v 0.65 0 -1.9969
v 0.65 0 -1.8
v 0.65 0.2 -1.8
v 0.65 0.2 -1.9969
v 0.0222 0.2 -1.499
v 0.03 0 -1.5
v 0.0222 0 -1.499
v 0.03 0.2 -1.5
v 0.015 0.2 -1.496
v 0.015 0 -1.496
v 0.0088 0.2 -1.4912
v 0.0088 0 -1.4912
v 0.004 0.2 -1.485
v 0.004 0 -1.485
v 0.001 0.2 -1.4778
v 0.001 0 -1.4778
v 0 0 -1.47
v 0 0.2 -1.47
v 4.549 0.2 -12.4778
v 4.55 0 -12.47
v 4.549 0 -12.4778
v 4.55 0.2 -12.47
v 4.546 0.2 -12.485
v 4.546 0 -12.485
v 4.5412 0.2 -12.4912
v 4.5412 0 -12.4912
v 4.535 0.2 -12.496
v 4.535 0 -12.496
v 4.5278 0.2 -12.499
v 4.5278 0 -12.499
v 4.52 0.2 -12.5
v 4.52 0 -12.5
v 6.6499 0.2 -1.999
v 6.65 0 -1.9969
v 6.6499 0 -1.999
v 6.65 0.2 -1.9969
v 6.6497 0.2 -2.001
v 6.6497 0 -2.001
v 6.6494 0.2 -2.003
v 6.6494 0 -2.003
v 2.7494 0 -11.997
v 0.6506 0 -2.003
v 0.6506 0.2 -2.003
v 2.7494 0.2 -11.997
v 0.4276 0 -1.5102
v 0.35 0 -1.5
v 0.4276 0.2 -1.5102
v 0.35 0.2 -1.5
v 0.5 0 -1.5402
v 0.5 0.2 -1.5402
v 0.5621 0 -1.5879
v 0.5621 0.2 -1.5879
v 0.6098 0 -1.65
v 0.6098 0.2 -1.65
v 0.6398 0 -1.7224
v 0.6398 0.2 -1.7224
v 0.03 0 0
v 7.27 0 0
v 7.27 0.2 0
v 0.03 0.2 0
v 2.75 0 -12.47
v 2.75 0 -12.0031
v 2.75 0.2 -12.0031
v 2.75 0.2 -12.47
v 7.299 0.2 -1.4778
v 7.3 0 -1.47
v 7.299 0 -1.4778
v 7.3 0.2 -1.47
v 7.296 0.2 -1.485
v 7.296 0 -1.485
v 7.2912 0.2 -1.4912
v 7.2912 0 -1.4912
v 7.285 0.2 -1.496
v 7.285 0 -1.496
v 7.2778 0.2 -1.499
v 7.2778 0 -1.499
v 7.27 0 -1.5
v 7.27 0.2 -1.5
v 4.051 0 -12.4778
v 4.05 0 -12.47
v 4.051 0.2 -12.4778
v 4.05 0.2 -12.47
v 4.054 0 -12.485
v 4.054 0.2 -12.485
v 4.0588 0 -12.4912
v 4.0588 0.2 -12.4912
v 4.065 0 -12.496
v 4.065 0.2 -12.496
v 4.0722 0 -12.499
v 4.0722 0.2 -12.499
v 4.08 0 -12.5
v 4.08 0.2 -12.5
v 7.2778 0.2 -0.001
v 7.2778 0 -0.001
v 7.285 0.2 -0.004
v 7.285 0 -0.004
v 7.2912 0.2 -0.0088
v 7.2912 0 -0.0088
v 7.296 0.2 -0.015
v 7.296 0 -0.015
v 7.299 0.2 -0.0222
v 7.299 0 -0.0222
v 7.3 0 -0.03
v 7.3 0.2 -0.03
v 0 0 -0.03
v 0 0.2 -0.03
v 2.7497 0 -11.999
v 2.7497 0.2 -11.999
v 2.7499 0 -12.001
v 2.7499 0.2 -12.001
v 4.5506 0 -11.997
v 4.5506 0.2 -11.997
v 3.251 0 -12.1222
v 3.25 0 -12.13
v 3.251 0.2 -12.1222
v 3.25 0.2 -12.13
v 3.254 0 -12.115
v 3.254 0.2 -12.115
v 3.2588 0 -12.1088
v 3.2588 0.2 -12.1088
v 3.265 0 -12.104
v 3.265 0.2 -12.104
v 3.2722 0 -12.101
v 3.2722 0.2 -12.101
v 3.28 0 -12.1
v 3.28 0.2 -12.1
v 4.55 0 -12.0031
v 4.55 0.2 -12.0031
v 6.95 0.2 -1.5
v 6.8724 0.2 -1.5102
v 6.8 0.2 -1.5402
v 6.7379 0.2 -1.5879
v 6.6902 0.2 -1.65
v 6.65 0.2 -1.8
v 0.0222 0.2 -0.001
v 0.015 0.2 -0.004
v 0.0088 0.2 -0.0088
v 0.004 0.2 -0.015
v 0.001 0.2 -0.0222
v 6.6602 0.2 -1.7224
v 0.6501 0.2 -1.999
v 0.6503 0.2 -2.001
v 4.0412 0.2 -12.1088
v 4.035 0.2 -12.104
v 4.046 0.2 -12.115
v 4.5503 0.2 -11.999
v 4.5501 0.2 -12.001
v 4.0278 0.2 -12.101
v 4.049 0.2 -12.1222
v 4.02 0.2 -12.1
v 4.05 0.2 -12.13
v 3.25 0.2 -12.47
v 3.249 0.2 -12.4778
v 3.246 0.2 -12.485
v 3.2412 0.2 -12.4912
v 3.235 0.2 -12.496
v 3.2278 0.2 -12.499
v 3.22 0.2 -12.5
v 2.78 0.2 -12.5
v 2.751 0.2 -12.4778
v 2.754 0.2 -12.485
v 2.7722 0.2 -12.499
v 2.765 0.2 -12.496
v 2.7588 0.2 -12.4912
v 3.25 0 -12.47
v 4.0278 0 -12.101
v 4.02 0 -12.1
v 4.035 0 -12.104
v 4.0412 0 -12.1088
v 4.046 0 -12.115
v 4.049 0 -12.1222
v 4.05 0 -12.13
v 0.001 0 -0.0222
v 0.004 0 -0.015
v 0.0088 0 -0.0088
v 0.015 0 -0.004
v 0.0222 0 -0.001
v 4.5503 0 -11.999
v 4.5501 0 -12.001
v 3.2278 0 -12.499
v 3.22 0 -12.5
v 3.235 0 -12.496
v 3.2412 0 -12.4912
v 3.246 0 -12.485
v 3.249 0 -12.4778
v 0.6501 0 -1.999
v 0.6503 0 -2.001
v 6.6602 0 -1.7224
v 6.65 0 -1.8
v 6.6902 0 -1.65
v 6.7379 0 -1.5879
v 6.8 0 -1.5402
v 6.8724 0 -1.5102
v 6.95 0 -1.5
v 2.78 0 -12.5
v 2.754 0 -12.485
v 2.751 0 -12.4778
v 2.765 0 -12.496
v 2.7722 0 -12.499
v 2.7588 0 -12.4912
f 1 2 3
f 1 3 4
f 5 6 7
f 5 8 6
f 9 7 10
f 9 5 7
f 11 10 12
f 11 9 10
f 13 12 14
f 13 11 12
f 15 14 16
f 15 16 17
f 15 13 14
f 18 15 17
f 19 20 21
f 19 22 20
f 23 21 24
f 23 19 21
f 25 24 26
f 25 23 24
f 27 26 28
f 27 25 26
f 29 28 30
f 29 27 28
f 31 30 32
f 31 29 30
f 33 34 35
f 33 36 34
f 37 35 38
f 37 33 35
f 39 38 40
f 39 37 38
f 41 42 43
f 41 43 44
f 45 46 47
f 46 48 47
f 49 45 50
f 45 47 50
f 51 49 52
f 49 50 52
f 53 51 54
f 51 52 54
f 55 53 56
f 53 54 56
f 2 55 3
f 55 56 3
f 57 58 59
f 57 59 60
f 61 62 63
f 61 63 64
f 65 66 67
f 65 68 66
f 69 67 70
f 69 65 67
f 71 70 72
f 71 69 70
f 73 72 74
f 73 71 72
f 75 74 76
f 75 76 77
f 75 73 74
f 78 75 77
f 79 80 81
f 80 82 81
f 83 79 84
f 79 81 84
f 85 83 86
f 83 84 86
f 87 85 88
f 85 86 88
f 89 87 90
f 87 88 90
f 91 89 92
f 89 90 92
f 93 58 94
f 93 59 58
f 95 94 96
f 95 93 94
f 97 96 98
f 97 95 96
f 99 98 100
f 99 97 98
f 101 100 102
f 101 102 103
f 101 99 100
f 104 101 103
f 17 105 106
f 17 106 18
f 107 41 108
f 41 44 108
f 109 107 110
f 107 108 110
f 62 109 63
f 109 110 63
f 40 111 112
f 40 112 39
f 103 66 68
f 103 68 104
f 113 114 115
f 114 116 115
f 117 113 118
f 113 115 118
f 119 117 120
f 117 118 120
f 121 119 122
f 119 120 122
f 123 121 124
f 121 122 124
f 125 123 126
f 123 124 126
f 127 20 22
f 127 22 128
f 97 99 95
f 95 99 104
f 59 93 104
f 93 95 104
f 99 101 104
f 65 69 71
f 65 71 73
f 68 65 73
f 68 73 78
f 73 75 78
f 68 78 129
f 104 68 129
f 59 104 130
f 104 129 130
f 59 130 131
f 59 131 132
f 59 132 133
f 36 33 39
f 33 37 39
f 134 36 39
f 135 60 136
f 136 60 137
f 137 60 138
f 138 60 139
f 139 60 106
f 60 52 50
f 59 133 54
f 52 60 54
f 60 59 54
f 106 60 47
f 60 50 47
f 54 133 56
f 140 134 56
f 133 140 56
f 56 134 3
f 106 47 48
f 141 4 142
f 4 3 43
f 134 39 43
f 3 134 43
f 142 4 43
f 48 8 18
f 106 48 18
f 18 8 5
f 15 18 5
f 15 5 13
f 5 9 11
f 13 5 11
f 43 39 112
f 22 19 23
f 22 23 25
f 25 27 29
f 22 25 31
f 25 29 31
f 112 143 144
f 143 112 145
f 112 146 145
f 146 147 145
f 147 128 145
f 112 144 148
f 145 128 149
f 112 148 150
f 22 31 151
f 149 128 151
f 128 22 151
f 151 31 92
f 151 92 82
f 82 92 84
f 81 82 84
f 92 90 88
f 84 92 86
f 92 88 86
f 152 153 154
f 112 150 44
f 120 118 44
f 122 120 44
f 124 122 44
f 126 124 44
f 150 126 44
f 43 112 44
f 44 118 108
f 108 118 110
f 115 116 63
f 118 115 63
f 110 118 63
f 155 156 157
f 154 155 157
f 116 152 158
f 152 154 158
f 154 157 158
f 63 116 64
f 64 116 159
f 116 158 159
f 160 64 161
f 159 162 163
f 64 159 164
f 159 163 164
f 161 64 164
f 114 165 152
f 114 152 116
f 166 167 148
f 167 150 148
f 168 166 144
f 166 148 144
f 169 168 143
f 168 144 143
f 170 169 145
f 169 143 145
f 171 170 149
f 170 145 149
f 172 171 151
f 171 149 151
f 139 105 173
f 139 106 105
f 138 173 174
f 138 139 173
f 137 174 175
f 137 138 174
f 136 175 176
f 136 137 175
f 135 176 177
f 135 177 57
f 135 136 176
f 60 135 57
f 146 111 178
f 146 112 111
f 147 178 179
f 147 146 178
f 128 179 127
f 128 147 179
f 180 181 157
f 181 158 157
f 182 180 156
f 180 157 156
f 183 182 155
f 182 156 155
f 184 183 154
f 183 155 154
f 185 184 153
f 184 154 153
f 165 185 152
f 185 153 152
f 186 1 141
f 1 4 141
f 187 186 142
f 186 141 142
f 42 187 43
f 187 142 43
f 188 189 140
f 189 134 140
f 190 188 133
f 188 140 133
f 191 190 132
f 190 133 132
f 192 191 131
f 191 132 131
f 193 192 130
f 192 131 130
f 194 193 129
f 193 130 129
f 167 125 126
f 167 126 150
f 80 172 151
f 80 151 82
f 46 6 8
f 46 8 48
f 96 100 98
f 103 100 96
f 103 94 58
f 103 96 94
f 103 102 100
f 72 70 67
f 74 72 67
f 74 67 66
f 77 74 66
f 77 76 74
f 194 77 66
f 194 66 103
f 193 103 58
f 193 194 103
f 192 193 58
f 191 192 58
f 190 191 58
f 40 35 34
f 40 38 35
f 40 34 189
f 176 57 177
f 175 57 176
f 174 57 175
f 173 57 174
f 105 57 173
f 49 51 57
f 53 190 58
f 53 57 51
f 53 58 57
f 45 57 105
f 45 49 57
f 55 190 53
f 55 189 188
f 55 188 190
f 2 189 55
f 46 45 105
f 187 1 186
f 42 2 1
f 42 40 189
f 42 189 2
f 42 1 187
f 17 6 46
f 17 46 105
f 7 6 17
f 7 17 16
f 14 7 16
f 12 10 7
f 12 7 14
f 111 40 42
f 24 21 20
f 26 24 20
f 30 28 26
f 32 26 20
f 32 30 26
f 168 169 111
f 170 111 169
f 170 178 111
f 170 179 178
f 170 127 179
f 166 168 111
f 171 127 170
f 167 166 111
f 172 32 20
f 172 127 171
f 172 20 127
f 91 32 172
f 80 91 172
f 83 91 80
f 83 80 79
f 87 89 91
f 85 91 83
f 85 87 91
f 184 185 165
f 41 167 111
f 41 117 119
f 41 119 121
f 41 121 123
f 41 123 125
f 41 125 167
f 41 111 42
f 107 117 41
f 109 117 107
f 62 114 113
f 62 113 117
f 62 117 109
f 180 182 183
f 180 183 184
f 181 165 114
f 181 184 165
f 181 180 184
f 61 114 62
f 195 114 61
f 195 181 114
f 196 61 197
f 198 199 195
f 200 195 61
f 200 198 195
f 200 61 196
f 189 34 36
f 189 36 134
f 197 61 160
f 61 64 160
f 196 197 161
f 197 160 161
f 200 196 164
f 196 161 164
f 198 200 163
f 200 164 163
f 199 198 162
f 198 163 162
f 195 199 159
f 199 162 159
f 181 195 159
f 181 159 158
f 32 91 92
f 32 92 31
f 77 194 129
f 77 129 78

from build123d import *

# Parameters (mm, degrees)
BOSS_EXTRUDE1_DEPTH = 0.2
FILLET1_R           = 0.3
FILLET2_R           = 0.03


with BuildPart() as part:
    # Sketch1 → Boss-Extrude1 (new body)
    with BuildSketch(Plane(origin=(0, 0, 0), x_dir=(1, 0, 0), z_dir=(0, 1, 0))):
        Polygon((0, 0), (0, 1.5), (0.65, 1.5), (0.65, 2), (2.75, 12), (2.75, 12.5), (3.25, 12.5), (3.25, 12.1), (4.05, 12.1), (4.05, 12.5), (4.55, 12.5), (4.55, 12), (6.65, 2), (6.65, 1.5), (7.3, 1.5), (7.3, 0), align=None)
    extrude(amount=BOSS_EXTRUDE1_DEPTH)

    # Fillet1
    fillet1_edges = [part.edges().sort_by_distance(p)[0] for p in [
        (0.65, 0.1, -1.5),
        (6.65, 0.1, -1.5),
    ]]
    fillet(fillet1_edges, radius=FILLET1_R)

    # Fillet2
    fillet2_edges = [part.edges().sort_by_distance(p)[0] for p in [
        (0, 0.1, 0),
        (0, 0.1, -1.5),
        (0.65, 0.1, -2),
        (2.75, 0.1, -12),
        (2.75, 0.1, -12.5),
        (3.25, 0.1, -12.5),
        (3.25, 0.1, -12.1),
        (4.05, 0.1, -12.1),
        (4.05, 0.1, -12.5),
        (4.55, 0.1, -12.5),
        (4.55, 0.1, -12),
        (6.65, 0.1, -2),
        (7.3, 0.1, -1.5),
        (7.3, 0.1, 0),
    ]]
    fillet(fillet2_edges, radius=FILLET2_R)


solid = part.part
